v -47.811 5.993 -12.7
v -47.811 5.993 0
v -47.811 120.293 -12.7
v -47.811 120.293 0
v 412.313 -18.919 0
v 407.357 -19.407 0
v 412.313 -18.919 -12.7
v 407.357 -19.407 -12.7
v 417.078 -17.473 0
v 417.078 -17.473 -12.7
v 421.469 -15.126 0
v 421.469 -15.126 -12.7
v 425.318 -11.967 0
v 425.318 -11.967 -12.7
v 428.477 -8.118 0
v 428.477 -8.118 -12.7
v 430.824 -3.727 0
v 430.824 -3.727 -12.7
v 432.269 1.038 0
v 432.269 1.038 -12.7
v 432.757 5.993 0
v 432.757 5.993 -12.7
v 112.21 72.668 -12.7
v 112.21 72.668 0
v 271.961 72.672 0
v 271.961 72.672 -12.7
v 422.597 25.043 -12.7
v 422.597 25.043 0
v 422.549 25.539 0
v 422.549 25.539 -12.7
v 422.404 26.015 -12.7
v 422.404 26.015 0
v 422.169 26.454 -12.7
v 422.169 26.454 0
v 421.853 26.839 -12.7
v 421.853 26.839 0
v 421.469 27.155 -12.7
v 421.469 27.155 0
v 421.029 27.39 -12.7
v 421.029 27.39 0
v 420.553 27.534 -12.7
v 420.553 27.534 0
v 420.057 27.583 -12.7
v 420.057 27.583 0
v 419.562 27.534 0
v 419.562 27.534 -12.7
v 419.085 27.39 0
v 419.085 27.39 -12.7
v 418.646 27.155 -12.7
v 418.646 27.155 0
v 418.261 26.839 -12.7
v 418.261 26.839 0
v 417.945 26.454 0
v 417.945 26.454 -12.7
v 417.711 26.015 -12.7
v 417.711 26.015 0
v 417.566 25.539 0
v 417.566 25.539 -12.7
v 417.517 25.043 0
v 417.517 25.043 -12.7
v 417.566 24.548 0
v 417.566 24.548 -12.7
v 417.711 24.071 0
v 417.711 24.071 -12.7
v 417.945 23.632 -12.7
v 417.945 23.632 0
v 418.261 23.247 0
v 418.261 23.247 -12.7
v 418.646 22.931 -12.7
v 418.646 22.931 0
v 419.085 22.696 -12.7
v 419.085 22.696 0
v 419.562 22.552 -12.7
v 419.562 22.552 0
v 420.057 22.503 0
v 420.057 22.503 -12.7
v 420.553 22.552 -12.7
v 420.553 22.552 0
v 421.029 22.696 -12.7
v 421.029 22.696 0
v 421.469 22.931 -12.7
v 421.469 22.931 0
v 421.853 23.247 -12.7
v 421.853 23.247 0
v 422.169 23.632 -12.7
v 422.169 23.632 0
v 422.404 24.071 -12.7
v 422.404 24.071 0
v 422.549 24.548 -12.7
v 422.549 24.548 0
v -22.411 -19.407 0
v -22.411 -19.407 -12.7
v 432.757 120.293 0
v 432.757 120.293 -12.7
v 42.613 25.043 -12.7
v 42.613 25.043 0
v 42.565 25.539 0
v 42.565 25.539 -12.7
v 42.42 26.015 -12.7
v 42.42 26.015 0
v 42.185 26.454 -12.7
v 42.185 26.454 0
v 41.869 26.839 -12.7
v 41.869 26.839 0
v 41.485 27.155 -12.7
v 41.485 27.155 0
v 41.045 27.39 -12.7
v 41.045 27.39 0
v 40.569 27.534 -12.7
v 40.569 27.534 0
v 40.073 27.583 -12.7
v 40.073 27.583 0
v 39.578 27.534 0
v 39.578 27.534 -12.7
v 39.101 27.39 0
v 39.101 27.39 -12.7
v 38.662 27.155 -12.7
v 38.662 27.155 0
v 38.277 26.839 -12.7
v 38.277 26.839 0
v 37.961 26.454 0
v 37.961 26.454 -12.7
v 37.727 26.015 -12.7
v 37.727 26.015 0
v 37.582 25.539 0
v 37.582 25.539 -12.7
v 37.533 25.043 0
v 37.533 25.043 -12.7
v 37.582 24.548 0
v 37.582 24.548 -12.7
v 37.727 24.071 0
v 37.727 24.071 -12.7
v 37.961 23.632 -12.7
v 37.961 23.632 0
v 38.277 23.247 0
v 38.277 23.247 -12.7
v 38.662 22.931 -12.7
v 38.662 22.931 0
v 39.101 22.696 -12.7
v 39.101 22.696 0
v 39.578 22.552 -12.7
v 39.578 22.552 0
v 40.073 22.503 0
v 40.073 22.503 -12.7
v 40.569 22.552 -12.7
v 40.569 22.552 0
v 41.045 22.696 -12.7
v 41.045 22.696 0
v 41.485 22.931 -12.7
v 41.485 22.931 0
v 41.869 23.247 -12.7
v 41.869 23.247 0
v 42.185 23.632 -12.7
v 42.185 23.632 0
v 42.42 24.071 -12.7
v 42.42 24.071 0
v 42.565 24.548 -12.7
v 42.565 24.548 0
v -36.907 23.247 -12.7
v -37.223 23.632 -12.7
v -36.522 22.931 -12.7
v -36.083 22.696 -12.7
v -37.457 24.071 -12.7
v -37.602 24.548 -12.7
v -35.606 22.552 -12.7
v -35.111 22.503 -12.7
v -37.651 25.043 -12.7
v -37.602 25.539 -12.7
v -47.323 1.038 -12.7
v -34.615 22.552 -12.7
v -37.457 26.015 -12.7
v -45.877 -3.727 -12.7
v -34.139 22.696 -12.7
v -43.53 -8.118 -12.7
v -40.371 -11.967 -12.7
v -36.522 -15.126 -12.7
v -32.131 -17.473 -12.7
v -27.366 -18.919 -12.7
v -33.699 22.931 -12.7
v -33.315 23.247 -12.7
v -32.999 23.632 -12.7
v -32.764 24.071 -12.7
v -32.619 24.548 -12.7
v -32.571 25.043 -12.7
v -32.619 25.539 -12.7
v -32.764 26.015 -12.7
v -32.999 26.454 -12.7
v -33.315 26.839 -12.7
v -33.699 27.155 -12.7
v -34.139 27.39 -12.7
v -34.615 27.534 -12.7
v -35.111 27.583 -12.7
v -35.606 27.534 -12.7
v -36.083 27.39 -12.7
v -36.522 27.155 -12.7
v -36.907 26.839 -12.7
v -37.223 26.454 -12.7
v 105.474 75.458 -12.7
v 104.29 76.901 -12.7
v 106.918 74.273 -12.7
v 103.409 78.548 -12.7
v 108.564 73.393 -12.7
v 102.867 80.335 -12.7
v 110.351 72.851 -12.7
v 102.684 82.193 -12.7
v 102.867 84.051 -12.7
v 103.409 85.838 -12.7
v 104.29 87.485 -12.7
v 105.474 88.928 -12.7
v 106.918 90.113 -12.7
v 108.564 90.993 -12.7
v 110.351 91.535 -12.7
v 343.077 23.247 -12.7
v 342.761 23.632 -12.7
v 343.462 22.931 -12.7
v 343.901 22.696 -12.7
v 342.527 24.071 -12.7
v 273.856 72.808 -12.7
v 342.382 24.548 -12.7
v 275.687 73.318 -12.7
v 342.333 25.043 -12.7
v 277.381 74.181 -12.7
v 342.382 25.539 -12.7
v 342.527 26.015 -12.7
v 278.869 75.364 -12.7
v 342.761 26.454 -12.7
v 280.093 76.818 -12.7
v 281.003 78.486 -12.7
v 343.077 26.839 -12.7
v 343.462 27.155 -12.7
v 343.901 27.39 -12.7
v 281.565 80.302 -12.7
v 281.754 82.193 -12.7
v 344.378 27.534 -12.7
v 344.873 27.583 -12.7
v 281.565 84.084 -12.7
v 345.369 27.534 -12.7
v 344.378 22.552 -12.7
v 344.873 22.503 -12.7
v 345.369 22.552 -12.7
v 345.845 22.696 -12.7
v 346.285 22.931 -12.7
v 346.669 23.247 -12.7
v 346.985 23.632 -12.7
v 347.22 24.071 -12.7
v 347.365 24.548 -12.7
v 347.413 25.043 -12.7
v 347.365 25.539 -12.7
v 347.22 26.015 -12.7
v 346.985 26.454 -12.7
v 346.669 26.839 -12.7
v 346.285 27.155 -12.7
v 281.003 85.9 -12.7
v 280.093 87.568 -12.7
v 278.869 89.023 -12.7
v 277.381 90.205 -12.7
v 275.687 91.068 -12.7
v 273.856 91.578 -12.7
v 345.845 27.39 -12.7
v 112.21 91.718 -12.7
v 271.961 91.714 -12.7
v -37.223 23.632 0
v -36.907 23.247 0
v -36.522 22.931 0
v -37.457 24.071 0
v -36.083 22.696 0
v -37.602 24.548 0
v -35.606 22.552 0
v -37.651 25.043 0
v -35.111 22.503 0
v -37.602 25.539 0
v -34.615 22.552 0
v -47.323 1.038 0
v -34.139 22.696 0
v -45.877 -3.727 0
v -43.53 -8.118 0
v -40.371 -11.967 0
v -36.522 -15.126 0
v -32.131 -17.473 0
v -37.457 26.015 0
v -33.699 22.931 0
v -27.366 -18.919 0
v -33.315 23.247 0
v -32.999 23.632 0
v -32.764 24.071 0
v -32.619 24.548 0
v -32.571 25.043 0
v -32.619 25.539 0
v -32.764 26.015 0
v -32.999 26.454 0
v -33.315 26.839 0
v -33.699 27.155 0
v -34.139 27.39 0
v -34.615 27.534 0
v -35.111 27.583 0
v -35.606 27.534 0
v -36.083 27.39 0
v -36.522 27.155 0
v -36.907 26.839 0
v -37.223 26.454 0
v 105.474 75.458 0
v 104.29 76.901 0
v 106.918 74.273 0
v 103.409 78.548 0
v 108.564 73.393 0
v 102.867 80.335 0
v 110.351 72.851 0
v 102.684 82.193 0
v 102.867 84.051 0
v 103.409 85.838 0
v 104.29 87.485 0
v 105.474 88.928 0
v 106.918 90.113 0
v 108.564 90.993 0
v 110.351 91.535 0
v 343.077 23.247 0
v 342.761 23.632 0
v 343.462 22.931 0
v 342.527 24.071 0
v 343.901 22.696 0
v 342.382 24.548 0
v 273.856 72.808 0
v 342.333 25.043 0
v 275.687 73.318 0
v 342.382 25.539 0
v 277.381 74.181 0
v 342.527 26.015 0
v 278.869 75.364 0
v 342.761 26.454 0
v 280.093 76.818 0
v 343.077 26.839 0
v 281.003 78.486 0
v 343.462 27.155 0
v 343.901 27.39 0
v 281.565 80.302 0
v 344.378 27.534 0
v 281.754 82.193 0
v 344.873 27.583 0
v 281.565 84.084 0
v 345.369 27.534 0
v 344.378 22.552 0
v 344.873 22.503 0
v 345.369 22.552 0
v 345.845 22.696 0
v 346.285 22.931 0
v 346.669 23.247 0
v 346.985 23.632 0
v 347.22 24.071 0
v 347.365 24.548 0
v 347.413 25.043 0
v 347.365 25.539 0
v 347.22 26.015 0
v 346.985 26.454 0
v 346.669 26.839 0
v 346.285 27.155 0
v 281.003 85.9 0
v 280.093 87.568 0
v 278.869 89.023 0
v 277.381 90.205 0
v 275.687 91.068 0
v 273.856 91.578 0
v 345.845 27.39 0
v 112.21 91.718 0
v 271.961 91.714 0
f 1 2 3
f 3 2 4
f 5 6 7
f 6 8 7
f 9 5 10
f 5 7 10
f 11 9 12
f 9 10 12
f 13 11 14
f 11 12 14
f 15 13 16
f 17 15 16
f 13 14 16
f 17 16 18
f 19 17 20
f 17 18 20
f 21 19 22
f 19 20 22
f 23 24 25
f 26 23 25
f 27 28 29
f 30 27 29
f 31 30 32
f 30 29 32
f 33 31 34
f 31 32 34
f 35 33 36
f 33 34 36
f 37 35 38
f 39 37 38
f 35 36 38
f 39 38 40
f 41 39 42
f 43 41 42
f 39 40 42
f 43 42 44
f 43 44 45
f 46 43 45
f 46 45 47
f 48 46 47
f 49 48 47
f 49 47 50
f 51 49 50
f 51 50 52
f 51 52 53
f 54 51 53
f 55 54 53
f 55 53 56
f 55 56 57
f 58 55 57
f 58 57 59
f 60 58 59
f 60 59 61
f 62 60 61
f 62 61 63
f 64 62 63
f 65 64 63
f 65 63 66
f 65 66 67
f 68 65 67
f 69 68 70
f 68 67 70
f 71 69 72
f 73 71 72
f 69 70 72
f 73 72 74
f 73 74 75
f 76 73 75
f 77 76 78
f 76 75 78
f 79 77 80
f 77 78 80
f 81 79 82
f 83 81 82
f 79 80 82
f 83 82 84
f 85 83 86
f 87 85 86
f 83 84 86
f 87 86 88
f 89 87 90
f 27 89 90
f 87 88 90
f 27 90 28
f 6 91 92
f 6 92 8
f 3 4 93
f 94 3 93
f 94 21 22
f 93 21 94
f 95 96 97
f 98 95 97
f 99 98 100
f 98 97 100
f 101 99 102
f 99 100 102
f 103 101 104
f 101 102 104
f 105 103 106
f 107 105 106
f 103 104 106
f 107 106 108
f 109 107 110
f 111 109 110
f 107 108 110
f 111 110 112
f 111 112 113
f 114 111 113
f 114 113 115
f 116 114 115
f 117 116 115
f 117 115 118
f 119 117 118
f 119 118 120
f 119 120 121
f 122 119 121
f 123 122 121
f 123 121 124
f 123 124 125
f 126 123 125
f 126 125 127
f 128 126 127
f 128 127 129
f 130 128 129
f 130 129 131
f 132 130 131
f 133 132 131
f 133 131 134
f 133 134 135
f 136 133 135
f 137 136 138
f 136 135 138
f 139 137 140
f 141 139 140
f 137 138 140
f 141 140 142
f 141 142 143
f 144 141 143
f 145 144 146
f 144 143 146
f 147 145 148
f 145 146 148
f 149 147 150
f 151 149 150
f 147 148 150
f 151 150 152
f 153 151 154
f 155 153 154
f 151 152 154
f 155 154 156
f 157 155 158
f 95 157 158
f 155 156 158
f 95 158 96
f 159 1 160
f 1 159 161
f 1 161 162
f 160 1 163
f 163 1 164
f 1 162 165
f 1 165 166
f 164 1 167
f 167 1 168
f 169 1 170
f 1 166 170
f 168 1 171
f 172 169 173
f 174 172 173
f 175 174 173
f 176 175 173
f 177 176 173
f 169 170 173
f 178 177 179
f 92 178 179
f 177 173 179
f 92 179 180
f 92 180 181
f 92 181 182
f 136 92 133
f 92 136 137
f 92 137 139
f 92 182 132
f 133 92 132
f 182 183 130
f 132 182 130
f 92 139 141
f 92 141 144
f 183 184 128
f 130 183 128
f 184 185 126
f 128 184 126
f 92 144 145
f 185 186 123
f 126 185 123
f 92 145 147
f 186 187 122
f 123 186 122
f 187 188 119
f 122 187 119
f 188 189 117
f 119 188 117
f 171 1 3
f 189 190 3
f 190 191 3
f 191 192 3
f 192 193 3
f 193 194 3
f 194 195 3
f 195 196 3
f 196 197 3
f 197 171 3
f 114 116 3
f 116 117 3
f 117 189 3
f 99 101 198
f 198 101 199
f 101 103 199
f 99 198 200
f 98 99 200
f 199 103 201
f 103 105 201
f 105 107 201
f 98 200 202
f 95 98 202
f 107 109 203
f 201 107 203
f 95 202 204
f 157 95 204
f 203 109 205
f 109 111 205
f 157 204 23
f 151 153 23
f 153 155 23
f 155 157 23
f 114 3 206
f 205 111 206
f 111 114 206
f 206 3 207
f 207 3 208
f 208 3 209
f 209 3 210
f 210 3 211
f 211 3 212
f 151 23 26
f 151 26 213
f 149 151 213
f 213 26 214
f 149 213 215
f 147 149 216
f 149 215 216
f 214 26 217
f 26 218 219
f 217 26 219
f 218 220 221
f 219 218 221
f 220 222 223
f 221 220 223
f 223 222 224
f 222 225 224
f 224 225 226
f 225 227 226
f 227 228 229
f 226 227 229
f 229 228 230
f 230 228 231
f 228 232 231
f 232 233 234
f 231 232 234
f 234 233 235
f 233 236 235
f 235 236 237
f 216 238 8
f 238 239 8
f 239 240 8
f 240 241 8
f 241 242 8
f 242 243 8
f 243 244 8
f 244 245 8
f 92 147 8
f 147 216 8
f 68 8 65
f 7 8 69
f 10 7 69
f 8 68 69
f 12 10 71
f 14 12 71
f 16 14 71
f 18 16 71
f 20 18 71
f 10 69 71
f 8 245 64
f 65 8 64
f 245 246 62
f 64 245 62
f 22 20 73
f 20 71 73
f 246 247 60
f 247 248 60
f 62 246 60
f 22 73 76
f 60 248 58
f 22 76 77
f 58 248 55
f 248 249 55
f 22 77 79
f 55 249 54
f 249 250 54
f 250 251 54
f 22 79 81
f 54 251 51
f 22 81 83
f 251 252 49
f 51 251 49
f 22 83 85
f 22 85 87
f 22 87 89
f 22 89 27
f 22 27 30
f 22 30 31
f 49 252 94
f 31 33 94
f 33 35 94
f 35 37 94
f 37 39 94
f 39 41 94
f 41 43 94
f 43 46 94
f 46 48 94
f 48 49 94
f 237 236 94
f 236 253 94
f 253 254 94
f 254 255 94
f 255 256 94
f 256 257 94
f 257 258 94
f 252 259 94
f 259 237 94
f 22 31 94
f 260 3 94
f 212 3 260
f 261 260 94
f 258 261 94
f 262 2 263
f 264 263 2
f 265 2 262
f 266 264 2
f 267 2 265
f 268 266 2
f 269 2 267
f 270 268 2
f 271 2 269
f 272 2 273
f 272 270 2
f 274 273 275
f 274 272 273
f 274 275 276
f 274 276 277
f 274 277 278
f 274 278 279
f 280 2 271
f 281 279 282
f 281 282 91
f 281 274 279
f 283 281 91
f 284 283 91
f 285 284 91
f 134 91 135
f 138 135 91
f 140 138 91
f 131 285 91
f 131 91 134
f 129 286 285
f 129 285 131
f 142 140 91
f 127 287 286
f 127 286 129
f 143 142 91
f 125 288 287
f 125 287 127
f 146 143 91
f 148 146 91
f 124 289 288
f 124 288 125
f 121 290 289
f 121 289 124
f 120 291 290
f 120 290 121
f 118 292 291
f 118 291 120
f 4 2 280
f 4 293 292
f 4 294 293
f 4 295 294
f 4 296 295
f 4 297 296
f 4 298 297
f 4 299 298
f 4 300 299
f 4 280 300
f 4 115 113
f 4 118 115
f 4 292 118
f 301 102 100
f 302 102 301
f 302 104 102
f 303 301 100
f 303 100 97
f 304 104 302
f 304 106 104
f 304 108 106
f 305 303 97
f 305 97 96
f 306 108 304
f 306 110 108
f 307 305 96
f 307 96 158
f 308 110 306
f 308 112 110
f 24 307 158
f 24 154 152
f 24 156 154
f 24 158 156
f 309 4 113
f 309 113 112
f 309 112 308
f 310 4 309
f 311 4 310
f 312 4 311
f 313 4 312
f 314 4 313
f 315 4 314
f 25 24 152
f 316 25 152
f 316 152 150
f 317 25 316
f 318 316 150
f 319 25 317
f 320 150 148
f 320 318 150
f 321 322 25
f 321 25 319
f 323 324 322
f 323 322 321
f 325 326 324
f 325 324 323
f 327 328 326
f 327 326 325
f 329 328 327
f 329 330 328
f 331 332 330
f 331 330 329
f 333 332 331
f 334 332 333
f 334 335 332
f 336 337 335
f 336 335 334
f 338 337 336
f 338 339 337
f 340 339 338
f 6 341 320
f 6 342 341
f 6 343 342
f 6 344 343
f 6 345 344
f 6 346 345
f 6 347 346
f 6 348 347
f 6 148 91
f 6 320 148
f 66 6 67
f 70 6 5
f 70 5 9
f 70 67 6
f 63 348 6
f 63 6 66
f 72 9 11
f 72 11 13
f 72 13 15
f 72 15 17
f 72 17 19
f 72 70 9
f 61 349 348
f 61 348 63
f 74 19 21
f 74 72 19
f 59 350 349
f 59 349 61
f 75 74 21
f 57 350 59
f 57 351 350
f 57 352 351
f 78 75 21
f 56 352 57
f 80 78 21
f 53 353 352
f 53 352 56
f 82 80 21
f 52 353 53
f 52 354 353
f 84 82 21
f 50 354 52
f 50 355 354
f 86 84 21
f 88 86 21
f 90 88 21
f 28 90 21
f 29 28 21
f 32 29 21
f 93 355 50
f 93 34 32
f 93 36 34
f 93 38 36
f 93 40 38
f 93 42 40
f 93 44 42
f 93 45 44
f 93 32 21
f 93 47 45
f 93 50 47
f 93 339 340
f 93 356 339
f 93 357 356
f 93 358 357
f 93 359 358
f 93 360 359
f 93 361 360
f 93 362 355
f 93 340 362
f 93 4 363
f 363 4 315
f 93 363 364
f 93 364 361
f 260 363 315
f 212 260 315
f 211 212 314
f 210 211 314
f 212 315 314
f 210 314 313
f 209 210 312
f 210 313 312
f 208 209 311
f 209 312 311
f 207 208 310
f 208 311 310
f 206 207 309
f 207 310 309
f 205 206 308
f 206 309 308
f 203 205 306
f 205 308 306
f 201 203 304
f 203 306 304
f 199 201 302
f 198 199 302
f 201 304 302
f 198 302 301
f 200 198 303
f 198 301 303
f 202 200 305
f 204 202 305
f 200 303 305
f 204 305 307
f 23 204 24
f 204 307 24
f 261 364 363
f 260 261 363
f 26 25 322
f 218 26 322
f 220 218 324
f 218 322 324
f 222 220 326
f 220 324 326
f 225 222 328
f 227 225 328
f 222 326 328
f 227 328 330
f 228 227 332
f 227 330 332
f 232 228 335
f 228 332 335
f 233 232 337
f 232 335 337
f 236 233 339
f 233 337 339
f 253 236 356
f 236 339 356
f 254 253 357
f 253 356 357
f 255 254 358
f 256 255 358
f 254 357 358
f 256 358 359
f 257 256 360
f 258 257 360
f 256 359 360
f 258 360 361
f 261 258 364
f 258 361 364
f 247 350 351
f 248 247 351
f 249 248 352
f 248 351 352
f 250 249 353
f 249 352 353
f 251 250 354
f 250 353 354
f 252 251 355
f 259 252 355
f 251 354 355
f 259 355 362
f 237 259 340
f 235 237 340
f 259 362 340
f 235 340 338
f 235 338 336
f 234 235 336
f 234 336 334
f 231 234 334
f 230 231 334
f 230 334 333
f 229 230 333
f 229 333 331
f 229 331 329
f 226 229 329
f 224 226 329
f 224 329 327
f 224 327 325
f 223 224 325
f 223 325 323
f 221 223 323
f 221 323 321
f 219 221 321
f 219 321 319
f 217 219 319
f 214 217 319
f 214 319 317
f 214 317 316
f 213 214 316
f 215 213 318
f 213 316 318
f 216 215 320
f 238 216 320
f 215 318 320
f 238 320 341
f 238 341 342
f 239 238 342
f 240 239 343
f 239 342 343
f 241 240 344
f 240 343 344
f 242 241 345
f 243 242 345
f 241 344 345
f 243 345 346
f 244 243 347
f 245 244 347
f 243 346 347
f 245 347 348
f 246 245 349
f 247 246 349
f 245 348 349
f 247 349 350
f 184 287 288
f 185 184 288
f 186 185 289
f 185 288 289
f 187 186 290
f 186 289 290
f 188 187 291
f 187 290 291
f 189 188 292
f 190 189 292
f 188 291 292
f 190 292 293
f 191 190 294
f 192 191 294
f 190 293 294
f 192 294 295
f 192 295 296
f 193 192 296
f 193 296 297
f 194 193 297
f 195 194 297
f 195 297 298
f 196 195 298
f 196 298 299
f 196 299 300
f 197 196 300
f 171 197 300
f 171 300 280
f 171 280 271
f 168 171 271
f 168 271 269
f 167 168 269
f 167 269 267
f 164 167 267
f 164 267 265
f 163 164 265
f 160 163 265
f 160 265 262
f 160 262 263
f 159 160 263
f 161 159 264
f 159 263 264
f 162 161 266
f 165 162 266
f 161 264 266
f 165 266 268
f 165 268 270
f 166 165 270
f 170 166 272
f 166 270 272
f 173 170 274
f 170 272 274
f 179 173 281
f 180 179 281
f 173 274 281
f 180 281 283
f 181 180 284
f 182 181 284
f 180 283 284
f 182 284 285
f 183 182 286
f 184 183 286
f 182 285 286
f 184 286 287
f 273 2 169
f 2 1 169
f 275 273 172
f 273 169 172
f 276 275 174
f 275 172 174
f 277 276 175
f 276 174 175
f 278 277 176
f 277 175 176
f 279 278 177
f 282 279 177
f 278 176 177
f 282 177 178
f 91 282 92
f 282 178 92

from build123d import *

# Parameters (mm, degrees)
F0_W     = 480.568
F0_H     = 139.7
F1_DEPTH = 12.7
F2_R     = 2.54
F3_DEPTH = 25.4
F4_R     = 25.4


with BuildPart() as f1:
    # F0 (on Top) → F1 (new body)
    with BuildSketch(Plane.XY):
        with Locations((192.473375, 50.443076)):
            Rectangle(F0_W, F0_H)
    extrude(amount=-F1_DEPTH)

    # F2 (on face) → F3 (cut)
    with BuildSketch(Plane.XY):
        with Locations((-35.110625, 25.043076)):
            Circle(F2_R)
        with BuildLine():
            Line((271.960707, 91.714286), (112.209601, 91.718076))
            ThreePointArc((112.209601, 91.718076), (102.684375, 82.193076), (112.209601, 72.668076))
            Line((112.209601, 72.668076), (271.960707, 72.671866))
            ThreePointArc((271.960707, 72.671866), (281.754375, 82.193076), (271.960707, 91.714286))
        make_face()
        with Locations((40.073375, 25.043076)):
            Circle(F2_R)
        with Locations((344.873375, 25.043076)):
            Circle(F2_R)
        with Locations((420.057375, 25.043076)):
            Circle(F2_R)
    extrude(amount=-F3_DEPTH, mode=Mode.SUBTRACT)

    # F4
    f4_edges = [f1.edges().sort_by_distance(p)[0] for p in [
        (-47.810625, -19.406924, -6.35),
        (432.757375, -19.406924, -6.35),
    ]]
    fillet(f4_edges, radius=F4_R)


solid = f1.part
